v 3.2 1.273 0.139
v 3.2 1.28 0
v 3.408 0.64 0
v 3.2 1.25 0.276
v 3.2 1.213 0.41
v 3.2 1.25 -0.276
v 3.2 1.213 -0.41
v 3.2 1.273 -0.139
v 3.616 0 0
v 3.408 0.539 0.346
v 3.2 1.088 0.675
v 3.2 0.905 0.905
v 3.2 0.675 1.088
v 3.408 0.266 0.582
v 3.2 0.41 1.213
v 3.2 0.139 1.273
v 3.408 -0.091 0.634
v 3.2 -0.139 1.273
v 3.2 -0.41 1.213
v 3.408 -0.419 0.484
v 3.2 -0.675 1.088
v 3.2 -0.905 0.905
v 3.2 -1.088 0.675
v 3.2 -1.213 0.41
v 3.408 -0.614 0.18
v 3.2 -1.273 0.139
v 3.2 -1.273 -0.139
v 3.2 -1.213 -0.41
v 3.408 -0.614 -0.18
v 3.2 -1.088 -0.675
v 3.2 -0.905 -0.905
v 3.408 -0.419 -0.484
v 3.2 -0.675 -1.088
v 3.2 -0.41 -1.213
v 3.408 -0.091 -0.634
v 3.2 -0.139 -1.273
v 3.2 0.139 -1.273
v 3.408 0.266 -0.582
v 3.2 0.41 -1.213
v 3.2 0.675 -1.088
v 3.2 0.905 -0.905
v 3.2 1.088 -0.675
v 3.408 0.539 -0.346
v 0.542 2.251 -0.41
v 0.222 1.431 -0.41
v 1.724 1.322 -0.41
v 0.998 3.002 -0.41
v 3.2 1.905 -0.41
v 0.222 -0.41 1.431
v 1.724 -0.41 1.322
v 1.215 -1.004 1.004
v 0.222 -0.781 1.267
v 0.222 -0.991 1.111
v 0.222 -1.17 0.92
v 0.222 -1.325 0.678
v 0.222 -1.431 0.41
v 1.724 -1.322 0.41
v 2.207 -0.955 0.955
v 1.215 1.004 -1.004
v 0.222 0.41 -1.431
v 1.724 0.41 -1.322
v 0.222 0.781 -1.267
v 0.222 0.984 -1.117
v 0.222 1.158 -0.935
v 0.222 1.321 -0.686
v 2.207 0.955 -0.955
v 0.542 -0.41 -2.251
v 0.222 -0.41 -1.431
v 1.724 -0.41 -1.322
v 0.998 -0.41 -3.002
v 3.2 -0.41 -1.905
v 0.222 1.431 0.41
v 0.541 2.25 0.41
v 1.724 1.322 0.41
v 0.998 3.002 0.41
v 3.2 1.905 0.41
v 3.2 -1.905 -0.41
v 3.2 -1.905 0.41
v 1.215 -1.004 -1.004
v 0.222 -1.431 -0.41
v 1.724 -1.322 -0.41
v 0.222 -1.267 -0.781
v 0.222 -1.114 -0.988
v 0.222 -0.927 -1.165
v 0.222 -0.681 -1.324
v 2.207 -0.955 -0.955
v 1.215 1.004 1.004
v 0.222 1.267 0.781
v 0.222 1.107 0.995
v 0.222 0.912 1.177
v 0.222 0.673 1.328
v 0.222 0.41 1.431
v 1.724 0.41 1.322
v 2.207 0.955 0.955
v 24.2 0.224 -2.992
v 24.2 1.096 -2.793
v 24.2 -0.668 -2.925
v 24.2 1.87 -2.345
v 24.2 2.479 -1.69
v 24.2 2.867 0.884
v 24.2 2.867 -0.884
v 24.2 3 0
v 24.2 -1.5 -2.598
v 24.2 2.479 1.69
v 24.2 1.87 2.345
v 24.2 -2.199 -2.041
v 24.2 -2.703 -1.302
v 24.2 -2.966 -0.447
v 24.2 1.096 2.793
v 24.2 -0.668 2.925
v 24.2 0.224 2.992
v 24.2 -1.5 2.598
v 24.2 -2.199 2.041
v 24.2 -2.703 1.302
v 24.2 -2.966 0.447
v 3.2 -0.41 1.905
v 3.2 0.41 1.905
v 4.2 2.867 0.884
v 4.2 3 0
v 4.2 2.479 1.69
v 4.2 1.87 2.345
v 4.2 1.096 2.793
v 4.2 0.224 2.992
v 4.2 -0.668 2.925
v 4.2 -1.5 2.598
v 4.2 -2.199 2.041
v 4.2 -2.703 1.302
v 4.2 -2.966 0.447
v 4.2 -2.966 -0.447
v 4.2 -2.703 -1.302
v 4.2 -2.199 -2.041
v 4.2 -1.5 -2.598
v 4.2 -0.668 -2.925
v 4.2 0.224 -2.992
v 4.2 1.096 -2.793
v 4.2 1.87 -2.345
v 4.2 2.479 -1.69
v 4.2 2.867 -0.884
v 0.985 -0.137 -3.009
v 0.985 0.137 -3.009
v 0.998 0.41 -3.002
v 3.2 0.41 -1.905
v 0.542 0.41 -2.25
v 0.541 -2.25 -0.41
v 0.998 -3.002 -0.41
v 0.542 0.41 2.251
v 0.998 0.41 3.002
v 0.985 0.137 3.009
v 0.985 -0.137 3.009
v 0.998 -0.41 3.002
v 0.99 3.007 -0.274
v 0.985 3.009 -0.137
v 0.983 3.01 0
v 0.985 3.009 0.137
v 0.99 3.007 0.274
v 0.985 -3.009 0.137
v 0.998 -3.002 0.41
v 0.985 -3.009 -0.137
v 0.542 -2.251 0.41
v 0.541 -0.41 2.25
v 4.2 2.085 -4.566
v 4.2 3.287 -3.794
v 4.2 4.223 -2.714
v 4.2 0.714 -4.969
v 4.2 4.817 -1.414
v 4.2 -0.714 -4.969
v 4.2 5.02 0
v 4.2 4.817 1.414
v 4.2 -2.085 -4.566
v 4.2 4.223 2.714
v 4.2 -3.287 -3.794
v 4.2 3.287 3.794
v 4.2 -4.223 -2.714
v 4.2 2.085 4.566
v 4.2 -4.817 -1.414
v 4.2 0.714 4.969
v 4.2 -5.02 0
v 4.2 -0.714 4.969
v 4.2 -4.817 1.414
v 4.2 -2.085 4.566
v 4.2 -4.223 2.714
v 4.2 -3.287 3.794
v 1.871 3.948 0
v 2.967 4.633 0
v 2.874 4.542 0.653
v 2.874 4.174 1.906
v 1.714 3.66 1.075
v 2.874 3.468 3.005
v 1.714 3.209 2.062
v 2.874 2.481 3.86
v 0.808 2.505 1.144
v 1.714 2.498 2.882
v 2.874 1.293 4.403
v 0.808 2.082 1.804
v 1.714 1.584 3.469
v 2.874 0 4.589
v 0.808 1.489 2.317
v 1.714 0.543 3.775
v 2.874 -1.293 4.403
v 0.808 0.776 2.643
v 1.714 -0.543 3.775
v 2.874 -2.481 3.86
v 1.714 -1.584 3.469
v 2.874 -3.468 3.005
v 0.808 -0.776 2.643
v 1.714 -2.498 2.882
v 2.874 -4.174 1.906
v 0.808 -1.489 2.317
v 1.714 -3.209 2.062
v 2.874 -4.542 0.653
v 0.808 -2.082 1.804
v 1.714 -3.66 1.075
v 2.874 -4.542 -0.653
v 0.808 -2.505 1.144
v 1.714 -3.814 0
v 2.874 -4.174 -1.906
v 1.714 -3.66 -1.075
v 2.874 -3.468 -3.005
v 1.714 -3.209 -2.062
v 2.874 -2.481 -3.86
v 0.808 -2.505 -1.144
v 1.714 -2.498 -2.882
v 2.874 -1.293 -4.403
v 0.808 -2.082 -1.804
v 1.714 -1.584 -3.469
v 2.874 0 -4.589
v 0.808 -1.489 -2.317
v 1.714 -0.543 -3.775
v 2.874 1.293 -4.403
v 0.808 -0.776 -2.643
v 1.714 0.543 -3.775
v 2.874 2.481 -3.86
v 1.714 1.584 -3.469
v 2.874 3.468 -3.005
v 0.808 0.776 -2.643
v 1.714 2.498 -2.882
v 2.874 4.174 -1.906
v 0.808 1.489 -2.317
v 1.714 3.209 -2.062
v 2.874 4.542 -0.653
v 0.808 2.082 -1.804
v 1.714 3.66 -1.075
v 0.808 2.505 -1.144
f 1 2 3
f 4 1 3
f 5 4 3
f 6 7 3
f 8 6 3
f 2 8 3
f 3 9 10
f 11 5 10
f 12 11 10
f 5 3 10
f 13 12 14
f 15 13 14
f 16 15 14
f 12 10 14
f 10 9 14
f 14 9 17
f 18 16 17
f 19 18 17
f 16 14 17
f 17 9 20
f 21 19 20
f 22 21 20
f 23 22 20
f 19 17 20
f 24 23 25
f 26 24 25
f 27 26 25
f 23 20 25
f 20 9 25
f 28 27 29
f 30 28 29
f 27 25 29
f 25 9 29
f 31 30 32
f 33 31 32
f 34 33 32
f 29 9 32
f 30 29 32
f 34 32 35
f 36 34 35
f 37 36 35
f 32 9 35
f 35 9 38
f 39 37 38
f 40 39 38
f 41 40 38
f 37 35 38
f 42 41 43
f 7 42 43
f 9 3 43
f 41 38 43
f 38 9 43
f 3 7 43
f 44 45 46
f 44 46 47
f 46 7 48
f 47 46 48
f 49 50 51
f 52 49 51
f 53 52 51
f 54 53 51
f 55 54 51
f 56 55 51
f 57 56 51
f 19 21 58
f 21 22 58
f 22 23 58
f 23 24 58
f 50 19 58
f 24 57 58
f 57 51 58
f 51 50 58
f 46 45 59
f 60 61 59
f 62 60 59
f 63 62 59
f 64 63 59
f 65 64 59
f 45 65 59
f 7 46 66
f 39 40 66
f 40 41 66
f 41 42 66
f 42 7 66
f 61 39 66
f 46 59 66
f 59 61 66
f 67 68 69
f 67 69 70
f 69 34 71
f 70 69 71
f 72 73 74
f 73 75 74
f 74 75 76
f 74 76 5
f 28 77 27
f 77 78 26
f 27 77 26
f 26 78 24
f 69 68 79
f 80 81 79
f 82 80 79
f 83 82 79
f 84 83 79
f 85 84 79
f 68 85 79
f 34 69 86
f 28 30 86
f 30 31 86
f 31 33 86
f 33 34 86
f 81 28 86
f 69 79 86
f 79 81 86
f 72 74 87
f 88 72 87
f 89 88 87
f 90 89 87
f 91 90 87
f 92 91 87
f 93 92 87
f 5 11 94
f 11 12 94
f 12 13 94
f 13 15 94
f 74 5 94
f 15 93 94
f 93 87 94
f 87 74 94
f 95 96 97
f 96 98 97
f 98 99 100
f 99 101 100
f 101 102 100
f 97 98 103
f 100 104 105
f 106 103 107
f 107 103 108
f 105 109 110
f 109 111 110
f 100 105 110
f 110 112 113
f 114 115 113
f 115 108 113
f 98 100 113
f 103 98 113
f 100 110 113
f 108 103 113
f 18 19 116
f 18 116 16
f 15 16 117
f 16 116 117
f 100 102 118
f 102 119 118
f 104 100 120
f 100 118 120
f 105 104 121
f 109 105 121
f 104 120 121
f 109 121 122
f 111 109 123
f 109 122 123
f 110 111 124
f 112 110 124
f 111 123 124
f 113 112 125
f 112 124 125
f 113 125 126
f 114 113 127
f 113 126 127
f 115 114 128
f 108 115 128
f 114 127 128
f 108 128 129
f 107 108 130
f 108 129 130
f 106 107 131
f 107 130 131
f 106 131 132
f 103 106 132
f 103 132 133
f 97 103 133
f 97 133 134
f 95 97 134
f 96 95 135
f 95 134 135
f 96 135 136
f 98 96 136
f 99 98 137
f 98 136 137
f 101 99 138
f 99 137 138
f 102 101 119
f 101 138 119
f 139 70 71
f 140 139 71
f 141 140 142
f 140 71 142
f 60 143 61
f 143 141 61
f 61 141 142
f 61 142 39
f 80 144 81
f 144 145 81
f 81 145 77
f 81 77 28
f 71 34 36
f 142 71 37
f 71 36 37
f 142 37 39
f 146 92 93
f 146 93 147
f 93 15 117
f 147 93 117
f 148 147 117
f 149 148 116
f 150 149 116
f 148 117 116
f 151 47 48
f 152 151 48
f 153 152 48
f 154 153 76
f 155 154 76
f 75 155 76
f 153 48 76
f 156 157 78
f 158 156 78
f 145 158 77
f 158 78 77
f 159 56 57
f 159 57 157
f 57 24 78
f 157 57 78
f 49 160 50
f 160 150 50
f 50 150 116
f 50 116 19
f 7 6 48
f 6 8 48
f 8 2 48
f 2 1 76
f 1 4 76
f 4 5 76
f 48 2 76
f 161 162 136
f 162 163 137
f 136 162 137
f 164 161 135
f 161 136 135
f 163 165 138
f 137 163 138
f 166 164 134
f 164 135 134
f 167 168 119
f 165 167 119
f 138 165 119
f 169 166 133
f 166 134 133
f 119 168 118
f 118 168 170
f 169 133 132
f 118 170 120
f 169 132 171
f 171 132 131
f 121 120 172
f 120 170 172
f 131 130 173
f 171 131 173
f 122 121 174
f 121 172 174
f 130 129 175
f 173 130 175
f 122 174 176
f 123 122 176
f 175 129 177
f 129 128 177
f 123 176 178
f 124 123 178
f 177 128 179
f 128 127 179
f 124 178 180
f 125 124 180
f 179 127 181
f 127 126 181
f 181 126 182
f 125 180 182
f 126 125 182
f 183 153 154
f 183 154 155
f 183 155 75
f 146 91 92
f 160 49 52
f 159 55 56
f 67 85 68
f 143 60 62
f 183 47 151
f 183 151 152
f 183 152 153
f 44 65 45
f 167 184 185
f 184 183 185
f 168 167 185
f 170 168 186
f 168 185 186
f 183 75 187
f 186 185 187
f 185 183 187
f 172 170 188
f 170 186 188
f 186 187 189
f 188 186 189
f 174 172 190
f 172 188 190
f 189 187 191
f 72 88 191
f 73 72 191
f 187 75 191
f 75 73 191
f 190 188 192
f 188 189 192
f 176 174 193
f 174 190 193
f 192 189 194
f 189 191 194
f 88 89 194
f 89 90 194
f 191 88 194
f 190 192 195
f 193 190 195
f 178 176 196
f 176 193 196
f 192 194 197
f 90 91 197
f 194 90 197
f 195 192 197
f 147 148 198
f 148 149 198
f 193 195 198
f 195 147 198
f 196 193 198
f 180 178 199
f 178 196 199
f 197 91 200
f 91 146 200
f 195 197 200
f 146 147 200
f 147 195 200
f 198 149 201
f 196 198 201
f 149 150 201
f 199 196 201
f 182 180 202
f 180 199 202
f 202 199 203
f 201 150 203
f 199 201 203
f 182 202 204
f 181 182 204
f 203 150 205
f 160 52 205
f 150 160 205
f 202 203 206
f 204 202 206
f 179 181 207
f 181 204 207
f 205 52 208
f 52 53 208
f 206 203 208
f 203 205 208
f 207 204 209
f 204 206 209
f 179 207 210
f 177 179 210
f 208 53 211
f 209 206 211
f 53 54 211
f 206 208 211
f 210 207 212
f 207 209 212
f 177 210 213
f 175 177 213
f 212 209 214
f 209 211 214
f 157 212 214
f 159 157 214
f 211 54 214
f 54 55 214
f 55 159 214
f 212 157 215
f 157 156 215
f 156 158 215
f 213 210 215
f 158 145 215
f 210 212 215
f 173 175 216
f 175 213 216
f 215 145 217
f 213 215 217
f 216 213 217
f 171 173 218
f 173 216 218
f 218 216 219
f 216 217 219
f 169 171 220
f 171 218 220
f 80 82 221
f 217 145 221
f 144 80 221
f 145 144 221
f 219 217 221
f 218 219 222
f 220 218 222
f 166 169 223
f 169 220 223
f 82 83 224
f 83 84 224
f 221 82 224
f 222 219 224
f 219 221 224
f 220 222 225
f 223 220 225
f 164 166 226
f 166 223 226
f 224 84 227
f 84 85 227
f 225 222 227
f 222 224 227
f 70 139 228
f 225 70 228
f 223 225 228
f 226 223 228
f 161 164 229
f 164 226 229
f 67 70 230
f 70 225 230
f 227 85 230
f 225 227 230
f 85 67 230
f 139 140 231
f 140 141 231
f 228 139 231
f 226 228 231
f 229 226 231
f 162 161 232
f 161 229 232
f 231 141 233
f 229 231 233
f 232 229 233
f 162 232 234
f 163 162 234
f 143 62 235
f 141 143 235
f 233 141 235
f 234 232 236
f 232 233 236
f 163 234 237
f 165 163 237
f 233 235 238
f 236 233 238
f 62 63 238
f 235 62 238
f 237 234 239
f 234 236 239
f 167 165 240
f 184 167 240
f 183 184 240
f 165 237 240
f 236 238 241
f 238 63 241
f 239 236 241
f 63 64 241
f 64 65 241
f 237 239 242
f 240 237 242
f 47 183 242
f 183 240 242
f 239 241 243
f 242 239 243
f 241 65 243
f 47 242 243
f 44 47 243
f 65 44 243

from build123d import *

# Parameters (mm, degrees)
SKETCH3_W    = 0.82
SKETCH3_H    = 7
SKETCH4_W    = 0.82
SKETCH4_H    = 3.809077818
RECPAT_COUNT = 2
RECPAT_ANGLE = 90


with BuildPart() as part:
    # BodySke → Base-Revolve (revolve)
    with BuildSketch(Plane.XY):
        with BuildLine():
            Line((4.2, 3), (4.2, 5.019960159))
            ThreePointArc((4.2, 5.019960159), (1.188478557, 3.272613634), (0, 0))
            Line((0, 0), (24.2, 0))
            Line((24.2, 0), (24.2, 3))
            Line((24.2, 3), (4.2, 3))
        make_face()
    revolve(axis=Axis((-25.4, 0, 0), (1, 0, 0)))

    # Sketch3 → Recess section 0
    with BuildSketch(Plane(origin=(0, 0, 0), x_dir=(0, 0, -1), z_dir=(1, 0, 0))):
        Rectangle(SKETCH3_W, SKETCH3_H)
    # Sketch4 → Recess section 1
    with BuildSketch(Plane(origin=(3.2, 0, 0), x_dir=(0, 0, -1), z_dir=(1, 0, 0))):
        Rectangle(SKETCH4_W, SKETCH4_H)
    recess = loft(mode=Mode.SUBTRACT)

    # RecPat: Recess ×2 about axis
    recpat_axis = Axis((0, 0, 0), (1, 0, 0))
    for i in range(1, RECPAT_COUNT):
        add(recess.rotate(recpat_axis, i * RECPAT_ANGLE / (RECPAT_COUNT - 1)), mode=Mode.SUBTRACT)

    # RecCorSke → RecessCore (revolve, cut)
    with BuildSketch(Plane.XY):
        Polygon((0, 0), (0, 1.504265798), (3.2, 1.2805), (3.616059671, 0), align=None)
    revolve(axis=Axis((-3.175, 0, 0), (1, 0, 0)), mode=Mode.SUBTRACT)


solid = part.part
